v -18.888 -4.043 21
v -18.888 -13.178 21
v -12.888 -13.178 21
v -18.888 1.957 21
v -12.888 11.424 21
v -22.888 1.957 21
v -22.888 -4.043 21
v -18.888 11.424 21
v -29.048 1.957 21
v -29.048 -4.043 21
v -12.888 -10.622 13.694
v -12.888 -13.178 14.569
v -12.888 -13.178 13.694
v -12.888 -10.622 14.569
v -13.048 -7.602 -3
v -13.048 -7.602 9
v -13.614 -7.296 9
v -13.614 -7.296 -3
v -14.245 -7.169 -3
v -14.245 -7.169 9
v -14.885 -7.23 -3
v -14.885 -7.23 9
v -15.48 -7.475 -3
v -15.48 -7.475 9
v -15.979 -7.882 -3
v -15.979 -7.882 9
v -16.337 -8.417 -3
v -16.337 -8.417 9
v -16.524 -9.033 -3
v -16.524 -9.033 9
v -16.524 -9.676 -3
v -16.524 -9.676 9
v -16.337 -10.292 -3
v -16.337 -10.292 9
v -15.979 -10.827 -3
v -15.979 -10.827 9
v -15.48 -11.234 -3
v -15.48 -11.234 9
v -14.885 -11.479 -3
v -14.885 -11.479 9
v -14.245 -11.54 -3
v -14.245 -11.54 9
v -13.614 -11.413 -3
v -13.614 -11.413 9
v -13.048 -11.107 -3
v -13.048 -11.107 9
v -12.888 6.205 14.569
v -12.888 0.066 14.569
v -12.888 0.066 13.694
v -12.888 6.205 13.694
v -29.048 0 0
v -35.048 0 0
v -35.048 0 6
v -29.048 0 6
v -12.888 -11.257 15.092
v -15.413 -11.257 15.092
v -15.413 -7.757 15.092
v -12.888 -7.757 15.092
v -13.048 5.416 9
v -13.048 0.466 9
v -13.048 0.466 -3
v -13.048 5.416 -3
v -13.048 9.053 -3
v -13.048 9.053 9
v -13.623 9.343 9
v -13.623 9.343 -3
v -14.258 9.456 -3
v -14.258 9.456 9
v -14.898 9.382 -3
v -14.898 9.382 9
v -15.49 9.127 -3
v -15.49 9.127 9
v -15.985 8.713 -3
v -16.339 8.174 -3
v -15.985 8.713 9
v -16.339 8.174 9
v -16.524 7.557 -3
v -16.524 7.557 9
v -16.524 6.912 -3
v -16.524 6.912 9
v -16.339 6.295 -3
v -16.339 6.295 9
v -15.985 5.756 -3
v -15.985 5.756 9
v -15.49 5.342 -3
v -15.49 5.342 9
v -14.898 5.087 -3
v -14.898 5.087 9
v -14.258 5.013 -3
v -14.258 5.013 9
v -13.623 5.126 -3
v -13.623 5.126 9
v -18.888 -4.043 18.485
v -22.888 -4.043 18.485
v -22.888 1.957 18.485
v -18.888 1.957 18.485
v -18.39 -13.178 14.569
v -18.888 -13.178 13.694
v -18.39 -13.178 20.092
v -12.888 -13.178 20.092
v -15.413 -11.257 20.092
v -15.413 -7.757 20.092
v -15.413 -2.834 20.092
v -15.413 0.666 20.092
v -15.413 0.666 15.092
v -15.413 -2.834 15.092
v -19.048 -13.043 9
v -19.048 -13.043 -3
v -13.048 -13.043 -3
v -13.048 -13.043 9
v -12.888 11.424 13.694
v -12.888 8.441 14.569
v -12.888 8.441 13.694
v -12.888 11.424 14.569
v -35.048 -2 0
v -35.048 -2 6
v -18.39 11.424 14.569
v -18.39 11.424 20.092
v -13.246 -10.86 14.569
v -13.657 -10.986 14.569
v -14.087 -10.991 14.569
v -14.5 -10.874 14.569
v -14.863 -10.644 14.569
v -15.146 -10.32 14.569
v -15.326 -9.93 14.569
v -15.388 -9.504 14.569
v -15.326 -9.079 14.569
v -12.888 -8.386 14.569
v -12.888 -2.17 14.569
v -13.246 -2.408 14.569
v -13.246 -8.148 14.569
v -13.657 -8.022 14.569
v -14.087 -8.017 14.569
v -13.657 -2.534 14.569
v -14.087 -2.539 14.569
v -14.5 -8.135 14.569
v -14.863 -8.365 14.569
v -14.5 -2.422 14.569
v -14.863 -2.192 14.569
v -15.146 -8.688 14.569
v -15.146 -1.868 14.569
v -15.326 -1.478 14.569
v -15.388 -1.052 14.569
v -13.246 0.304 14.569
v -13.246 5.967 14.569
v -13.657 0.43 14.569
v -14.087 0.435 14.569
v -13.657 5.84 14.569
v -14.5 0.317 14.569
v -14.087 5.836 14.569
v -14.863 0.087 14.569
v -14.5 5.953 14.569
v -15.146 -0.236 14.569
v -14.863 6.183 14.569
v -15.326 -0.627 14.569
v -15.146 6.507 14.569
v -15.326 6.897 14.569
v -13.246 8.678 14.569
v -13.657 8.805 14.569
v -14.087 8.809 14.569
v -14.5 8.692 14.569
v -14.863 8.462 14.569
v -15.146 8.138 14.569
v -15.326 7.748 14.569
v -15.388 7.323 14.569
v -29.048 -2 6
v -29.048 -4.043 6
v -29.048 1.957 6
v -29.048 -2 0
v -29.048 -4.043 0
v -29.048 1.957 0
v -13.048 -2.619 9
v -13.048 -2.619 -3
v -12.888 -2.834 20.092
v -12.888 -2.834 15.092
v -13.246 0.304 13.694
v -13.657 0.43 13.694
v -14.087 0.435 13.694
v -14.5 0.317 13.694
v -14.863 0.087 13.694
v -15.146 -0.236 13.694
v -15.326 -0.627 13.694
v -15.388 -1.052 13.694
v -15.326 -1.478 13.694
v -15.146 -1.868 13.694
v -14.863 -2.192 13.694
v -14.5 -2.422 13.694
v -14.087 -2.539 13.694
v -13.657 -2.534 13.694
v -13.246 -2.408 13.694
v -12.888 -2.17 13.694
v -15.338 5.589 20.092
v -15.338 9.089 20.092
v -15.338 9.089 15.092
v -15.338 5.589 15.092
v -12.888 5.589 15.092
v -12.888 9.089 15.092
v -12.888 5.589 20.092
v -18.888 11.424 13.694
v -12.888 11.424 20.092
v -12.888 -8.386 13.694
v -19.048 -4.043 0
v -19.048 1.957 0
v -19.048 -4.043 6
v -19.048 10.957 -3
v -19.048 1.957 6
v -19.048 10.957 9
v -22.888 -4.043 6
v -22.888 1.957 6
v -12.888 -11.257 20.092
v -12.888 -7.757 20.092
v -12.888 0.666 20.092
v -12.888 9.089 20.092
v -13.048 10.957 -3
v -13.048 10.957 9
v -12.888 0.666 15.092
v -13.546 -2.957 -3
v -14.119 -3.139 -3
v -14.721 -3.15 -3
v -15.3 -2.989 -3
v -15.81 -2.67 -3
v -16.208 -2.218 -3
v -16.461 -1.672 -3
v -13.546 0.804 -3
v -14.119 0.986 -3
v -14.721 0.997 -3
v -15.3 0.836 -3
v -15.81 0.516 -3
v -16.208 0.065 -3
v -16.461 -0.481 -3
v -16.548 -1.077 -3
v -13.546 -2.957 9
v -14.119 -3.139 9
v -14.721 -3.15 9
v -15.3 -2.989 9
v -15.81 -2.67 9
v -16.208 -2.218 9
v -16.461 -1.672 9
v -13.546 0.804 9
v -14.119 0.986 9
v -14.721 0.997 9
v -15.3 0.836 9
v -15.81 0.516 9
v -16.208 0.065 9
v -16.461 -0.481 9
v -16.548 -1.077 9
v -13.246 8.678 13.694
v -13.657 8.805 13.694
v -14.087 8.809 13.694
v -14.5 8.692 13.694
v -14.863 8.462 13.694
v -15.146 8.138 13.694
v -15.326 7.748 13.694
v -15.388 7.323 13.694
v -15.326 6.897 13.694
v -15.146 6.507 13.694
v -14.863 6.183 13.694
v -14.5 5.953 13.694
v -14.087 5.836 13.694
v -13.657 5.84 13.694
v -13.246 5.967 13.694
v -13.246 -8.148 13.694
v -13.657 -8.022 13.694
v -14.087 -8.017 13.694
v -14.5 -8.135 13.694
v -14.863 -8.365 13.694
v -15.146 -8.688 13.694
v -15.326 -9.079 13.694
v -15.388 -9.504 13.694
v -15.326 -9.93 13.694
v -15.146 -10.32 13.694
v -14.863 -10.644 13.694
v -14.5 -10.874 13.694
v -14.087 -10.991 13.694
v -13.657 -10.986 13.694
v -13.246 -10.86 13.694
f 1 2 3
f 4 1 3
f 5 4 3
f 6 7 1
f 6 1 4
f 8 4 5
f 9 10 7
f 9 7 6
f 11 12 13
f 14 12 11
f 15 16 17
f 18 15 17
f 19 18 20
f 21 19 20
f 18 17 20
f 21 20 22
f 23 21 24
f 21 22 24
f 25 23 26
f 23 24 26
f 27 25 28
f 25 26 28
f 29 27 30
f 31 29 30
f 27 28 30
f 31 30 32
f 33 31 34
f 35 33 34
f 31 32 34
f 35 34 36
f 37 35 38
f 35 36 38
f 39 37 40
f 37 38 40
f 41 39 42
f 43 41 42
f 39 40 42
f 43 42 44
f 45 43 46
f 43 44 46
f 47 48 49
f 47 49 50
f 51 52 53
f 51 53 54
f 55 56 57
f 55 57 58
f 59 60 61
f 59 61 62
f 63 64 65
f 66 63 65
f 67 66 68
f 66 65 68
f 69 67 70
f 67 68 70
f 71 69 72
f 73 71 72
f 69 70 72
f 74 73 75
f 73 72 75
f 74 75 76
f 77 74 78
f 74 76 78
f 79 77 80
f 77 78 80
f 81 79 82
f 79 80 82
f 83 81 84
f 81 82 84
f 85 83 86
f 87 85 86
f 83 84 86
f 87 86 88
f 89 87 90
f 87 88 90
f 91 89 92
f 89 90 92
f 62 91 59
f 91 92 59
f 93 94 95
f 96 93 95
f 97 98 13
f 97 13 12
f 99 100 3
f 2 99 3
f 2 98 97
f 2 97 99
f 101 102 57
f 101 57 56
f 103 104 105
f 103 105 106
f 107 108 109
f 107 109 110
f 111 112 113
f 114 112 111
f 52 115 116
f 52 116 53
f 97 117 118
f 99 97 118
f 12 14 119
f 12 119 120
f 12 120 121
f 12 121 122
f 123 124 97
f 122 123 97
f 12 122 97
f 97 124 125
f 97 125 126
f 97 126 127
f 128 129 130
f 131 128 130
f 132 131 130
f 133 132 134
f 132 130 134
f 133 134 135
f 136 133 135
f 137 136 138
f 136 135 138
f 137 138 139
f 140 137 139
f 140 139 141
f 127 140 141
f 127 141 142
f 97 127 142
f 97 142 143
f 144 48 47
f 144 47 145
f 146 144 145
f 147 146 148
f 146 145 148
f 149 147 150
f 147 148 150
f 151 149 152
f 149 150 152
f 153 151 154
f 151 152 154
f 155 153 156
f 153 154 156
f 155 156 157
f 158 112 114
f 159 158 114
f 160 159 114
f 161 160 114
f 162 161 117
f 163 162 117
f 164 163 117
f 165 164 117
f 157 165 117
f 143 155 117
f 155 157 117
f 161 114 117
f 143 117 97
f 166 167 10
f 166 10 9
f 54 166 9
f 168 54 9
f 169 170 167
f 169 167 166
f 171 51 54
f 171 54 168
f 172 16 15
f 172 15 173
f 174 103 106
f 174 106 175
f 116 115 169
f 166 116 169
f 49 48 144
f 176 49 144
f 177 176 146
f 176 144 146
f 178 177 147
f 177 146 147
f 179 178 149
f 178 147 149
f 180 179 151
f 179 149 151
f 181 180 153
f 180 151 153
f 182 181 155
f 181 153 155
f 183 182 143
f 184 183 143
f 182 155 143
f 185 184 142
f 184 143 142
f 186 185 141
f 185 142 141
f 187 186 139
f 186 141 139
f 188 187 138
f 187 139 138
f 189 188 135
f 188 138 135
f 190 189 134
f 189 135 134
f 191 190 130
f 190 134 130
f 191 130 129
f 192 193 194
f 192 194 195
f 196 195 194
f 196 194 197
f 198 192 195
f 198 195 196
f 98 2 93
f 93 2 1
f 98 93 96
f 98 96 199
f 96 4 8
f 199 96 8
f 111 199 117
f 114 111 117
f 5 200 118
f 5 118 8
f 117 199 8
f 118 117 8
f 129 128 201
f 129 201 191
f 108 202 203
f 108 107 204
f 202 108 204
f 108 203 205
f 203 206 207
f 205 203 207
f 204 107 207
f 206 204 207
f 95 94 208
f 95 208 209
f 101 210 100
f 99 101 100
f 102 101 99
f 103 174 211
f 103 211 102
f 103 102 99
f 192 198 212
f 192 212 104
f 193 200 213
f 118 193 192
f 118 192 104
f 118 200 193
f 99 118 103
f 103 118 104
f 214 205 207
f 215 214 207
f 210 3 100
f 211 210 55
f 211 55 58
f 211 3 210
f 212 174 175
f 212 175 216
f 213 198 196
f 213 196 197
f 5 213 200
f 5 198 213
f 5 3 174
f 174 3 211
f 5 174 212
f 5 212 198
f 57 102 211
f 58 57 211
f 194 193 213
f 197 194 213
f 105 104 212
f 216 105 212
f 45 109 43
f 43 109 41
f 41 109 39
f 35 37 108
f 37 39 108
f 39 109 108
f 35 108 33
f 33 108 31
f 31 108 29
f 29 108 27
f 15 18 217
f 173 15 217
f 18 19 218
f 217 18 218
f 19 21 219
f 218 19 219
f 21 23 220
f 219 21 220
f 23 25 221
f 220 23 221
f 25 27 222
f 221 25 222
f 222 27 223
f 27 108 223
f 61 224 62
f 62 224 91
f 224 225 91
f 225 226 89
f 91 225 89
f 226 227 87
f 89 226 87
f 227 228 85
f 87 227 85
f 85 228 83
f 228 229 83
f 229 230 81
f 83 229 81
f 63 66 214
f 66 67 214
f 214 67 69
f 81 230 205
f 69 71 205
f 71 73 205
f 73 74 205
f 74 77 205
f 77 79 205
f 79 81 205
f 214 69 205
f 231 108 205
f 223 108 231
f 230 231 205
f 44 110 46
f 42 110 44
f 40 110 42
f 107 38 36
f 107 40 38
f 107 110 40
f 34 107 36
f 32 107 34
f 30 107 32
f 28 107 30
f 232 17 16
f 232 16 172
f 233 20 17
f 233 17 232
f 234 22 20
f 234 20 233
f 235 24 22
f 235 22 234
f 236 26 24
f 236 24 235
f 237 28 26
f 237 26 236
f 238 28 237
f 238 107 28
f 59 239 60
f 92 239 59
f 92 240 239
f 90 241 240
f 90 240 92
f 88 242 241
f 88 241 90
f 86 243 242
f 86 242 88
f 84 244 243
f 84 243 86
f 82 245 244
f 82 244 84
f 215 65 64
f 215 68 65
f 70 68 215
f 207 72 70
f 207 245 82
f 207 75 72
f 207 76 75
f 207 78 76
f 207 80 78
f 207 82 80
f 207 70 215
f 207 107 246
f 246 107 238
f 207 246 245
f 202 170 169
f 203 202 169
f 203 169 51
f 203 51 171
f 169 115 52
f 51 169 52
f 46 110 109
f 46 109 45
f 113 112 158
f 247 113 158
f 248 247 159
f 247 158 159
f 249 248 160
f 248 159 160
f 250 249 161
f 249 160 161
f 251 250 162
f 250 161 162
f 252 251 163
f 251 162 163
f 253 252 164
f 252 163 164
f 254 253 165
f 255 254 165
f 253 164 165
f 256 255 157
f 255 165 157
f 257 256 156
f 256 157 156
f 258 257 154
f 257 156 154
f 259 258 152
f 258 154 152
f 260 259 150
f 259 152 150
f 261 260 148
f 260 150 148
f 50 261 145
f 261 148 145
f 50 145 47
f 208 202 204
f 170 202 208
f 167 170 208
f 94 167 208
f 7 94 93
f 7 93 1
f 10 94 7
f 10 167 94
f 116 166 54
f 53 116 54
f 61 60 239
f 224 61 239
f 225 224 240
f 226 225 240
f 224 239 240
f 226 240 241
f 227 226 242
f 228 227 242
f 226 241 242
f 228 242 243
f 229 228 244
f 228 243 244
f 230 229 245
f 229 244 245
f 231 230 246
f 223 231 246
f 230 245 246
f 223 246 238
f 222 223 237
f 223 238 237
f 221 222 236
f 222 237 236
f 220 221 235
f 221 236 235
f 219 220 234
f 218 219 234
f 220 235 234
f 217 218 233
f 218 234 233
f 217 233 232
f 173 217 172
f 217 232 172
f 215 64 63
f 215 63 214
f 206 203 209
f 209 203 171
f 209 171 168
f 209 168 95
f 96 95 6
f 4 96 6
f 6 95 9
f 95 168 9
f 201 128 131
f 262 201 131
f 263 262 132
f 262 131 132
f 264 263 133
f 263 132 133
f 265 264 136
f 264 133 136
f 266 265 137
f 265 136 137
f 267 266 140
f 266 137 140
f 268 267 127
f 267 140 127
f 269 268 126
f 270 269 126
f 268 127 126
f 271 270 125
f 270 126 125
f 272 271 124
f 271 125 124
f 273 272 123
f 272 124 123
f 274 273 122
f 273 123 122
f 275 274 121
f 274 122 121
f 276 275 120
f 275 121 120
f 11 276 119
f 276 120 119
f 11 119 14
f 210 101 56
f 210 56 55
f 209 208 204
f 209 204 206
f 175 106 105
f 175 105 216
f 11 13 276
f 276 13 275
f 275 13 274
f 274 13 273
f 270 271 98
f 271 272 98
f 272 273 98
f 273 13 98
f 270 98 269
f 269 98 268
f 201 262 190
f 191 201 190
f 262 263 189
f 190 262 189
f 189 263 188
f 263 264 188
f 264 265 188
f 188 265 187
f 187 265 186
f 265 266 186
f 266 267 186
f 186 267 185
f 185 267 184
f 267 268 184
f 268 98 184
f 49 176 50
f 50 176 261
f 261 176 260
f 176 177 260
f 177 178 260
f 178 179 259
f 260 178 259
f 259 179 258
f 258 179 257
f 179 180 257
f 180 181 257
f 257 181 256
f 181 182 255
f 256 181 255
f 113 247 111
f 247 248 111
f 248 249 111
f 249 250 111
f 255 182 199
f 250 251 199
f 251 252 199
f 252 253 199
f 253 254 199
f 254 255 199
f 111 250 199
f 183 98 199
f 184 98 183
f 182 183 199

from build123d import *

# Parameters (mm, degrees)
F0_W      = 6
F0_H      = 2
F1_DEPTH  = 6
F2_W      = 6
F2_H      = 6
F3_DEPTH  = 10
F4_W      = 24
F4_H      = 12
F5_DEPTH  = 6
F7_DEPTH  = 12.001
F8_W      = 6.1598163333
F8_H      = 6
F9_DEPTH  = 15
F10_W     = 6
F10_H     = 2.5150536597
F11_DEPTH = 4
F12_W     = 24.6021291241
F12_H     = 7.3056968898
F13_DEPTH = 6
F14_W     = 5.5018218607
F14_H     = 5.5230222642
F15_DEPTH = 24.6031291241
F16_R     = 1.5
F17_DEPTH = 1
F18_W     = 2.4501711503
F18_H     = 3.5
F18_W_2   = 2.5247114152
F18_W_3   = 2.5247123465
F19_DEPTH = 5


with BuildPart() as f1:
    # F0 (on Top) → F1 (new body)
    with BuildSketch(Plane.XY):
        with Locations((-32.0476180848, -1)):
            Rectangle(F0_W, F0_H)
    extrude(amount=F1_DEPTH)

    # F2 (on face) → F3 (join)
    with BuildSketch(Plane.YZ.offset(-29.0476180848)):
        with Locations((-1.0433437443, 3)):
            Rectangle(F2_W, F2_H)
    extrude(amount=F3_DEPTH)

    # F4 (on face) → F5 (join)
    with BuildSketch(Plane.YZ.offset(-19.0476180848)):
        with Locations((-1.0433437443, 3)):
            Rectangle(F4_W, F4_H)
    extrude(amount=F5_DEPTH)

    # F6 (on face) → F7 (cut, through all)
    with BuildSketch(Plane.XY.offset(9)):
        with BuildLine():
            Line((-13.0476180848, -11.1071496376), (-13.0476180848, -7.6019221608))
            ThreePointArc((-13.0476180848, -7.6019221608), (-16.5476180848, -9.3545358992), (-13.0476180848, -11.1071496376))
        make_face()
        with BuildLine():
            ThreePointArc((-13.0476180848, 0.4656811595), (-16.5476180848, -1.0765416363), (-13.0476180848, -2.618764432))
            Line((-13.0476180848, -2.618764432), (-13.0476180848, 0.4656811595))
        make_face()
        with BuildLine():
            ThreePointArc((-13.0476180848, 9.0525666852), (-16.5476180848, 7.234418936), (-13.0476180848, 5.4162711868))
            Line((-13.0476180848, 5.4162711868), (-13.0476180848, 9.0525666852))
        make_face()
    extrude(amount=-F7_DEPTH, mode=Mode.SUBTRACT)

    # F8 (on face) → F9 (join)
    with BuildSketch(Plane.XY.offset(6)):
        with Locations((-25.9677099181, -1.0433437443)):
            Rectangle(F8_W, F8_H)
    extrude(amount=F9_DEPTH)

    # F10 (on face) → F11 (join)
    with BuildSketch(Plane.YZ.offset(-22.8878017515)):
        with Locations((-1.0433437443, 19.7424731702)):
            Rectangle(F10_W, F10_H)
    extrude(amount=F11_DEPTH)

    # F12 (on face) → F13 (join)
    with BuildSketch(Plane.YZ.offset(-18.8878017515)):
        with Locations((-0.8769654669, 17.3471515551)):
            Rectangle(F12_W, F12_H)
    extrude(amount=F13_DEPTH)

    # F14 (on face) → F15 (cut, through all)
    with BuildSketch(Plane(origin=(0, 11.4240990952, 0), x_dir=(-1, 0, 0), z_dir=(0, 1, 0))):
        with Locations((15.6387126818, 17.3303969204)):
            Rectangle(F14_W, F14_H)
    extrude(amount=-F15_DEPTH, mode=Mode.SUBTRACT)

    # F16 (on face) → F17 (cut)
    with BuildSketch(Plane.XY.offset(14.5688857883)):
        with Locations((-13.8878017515, -9.5042175321)):
            Circle(F16_R)
        with Locations((-13.8878017515, -1.0522056698)):
            Circle(F16_R)
        with Locations((-13.8878017515, 7.322568293)):
            Circle(F16_R)
    extrude(amount=-F17_DEPTH, mode=Mode.SUBTRACT)

    # F18 (on face) → F19 (join)
    with BuildSketch(Plane(origin=(0, 0, 20.0919080526), x_dir=(1, 0, 0), z_dir=(0, 0, -1))):
        with Locations((-14.1128873266, -7.338691324)):
            Rectangle(F18_W, F18_H)
        with Locations((-14.1501574591, 1.0843175156)):
            Rectangle(F18_W_2, F18_H)
        with Locations((-14.1501579247, 9.5073256567)):
            Rectangle(F18_W_3, F18_H)
    extrude(amount=F19_DEPTH)


solid = f1.part
